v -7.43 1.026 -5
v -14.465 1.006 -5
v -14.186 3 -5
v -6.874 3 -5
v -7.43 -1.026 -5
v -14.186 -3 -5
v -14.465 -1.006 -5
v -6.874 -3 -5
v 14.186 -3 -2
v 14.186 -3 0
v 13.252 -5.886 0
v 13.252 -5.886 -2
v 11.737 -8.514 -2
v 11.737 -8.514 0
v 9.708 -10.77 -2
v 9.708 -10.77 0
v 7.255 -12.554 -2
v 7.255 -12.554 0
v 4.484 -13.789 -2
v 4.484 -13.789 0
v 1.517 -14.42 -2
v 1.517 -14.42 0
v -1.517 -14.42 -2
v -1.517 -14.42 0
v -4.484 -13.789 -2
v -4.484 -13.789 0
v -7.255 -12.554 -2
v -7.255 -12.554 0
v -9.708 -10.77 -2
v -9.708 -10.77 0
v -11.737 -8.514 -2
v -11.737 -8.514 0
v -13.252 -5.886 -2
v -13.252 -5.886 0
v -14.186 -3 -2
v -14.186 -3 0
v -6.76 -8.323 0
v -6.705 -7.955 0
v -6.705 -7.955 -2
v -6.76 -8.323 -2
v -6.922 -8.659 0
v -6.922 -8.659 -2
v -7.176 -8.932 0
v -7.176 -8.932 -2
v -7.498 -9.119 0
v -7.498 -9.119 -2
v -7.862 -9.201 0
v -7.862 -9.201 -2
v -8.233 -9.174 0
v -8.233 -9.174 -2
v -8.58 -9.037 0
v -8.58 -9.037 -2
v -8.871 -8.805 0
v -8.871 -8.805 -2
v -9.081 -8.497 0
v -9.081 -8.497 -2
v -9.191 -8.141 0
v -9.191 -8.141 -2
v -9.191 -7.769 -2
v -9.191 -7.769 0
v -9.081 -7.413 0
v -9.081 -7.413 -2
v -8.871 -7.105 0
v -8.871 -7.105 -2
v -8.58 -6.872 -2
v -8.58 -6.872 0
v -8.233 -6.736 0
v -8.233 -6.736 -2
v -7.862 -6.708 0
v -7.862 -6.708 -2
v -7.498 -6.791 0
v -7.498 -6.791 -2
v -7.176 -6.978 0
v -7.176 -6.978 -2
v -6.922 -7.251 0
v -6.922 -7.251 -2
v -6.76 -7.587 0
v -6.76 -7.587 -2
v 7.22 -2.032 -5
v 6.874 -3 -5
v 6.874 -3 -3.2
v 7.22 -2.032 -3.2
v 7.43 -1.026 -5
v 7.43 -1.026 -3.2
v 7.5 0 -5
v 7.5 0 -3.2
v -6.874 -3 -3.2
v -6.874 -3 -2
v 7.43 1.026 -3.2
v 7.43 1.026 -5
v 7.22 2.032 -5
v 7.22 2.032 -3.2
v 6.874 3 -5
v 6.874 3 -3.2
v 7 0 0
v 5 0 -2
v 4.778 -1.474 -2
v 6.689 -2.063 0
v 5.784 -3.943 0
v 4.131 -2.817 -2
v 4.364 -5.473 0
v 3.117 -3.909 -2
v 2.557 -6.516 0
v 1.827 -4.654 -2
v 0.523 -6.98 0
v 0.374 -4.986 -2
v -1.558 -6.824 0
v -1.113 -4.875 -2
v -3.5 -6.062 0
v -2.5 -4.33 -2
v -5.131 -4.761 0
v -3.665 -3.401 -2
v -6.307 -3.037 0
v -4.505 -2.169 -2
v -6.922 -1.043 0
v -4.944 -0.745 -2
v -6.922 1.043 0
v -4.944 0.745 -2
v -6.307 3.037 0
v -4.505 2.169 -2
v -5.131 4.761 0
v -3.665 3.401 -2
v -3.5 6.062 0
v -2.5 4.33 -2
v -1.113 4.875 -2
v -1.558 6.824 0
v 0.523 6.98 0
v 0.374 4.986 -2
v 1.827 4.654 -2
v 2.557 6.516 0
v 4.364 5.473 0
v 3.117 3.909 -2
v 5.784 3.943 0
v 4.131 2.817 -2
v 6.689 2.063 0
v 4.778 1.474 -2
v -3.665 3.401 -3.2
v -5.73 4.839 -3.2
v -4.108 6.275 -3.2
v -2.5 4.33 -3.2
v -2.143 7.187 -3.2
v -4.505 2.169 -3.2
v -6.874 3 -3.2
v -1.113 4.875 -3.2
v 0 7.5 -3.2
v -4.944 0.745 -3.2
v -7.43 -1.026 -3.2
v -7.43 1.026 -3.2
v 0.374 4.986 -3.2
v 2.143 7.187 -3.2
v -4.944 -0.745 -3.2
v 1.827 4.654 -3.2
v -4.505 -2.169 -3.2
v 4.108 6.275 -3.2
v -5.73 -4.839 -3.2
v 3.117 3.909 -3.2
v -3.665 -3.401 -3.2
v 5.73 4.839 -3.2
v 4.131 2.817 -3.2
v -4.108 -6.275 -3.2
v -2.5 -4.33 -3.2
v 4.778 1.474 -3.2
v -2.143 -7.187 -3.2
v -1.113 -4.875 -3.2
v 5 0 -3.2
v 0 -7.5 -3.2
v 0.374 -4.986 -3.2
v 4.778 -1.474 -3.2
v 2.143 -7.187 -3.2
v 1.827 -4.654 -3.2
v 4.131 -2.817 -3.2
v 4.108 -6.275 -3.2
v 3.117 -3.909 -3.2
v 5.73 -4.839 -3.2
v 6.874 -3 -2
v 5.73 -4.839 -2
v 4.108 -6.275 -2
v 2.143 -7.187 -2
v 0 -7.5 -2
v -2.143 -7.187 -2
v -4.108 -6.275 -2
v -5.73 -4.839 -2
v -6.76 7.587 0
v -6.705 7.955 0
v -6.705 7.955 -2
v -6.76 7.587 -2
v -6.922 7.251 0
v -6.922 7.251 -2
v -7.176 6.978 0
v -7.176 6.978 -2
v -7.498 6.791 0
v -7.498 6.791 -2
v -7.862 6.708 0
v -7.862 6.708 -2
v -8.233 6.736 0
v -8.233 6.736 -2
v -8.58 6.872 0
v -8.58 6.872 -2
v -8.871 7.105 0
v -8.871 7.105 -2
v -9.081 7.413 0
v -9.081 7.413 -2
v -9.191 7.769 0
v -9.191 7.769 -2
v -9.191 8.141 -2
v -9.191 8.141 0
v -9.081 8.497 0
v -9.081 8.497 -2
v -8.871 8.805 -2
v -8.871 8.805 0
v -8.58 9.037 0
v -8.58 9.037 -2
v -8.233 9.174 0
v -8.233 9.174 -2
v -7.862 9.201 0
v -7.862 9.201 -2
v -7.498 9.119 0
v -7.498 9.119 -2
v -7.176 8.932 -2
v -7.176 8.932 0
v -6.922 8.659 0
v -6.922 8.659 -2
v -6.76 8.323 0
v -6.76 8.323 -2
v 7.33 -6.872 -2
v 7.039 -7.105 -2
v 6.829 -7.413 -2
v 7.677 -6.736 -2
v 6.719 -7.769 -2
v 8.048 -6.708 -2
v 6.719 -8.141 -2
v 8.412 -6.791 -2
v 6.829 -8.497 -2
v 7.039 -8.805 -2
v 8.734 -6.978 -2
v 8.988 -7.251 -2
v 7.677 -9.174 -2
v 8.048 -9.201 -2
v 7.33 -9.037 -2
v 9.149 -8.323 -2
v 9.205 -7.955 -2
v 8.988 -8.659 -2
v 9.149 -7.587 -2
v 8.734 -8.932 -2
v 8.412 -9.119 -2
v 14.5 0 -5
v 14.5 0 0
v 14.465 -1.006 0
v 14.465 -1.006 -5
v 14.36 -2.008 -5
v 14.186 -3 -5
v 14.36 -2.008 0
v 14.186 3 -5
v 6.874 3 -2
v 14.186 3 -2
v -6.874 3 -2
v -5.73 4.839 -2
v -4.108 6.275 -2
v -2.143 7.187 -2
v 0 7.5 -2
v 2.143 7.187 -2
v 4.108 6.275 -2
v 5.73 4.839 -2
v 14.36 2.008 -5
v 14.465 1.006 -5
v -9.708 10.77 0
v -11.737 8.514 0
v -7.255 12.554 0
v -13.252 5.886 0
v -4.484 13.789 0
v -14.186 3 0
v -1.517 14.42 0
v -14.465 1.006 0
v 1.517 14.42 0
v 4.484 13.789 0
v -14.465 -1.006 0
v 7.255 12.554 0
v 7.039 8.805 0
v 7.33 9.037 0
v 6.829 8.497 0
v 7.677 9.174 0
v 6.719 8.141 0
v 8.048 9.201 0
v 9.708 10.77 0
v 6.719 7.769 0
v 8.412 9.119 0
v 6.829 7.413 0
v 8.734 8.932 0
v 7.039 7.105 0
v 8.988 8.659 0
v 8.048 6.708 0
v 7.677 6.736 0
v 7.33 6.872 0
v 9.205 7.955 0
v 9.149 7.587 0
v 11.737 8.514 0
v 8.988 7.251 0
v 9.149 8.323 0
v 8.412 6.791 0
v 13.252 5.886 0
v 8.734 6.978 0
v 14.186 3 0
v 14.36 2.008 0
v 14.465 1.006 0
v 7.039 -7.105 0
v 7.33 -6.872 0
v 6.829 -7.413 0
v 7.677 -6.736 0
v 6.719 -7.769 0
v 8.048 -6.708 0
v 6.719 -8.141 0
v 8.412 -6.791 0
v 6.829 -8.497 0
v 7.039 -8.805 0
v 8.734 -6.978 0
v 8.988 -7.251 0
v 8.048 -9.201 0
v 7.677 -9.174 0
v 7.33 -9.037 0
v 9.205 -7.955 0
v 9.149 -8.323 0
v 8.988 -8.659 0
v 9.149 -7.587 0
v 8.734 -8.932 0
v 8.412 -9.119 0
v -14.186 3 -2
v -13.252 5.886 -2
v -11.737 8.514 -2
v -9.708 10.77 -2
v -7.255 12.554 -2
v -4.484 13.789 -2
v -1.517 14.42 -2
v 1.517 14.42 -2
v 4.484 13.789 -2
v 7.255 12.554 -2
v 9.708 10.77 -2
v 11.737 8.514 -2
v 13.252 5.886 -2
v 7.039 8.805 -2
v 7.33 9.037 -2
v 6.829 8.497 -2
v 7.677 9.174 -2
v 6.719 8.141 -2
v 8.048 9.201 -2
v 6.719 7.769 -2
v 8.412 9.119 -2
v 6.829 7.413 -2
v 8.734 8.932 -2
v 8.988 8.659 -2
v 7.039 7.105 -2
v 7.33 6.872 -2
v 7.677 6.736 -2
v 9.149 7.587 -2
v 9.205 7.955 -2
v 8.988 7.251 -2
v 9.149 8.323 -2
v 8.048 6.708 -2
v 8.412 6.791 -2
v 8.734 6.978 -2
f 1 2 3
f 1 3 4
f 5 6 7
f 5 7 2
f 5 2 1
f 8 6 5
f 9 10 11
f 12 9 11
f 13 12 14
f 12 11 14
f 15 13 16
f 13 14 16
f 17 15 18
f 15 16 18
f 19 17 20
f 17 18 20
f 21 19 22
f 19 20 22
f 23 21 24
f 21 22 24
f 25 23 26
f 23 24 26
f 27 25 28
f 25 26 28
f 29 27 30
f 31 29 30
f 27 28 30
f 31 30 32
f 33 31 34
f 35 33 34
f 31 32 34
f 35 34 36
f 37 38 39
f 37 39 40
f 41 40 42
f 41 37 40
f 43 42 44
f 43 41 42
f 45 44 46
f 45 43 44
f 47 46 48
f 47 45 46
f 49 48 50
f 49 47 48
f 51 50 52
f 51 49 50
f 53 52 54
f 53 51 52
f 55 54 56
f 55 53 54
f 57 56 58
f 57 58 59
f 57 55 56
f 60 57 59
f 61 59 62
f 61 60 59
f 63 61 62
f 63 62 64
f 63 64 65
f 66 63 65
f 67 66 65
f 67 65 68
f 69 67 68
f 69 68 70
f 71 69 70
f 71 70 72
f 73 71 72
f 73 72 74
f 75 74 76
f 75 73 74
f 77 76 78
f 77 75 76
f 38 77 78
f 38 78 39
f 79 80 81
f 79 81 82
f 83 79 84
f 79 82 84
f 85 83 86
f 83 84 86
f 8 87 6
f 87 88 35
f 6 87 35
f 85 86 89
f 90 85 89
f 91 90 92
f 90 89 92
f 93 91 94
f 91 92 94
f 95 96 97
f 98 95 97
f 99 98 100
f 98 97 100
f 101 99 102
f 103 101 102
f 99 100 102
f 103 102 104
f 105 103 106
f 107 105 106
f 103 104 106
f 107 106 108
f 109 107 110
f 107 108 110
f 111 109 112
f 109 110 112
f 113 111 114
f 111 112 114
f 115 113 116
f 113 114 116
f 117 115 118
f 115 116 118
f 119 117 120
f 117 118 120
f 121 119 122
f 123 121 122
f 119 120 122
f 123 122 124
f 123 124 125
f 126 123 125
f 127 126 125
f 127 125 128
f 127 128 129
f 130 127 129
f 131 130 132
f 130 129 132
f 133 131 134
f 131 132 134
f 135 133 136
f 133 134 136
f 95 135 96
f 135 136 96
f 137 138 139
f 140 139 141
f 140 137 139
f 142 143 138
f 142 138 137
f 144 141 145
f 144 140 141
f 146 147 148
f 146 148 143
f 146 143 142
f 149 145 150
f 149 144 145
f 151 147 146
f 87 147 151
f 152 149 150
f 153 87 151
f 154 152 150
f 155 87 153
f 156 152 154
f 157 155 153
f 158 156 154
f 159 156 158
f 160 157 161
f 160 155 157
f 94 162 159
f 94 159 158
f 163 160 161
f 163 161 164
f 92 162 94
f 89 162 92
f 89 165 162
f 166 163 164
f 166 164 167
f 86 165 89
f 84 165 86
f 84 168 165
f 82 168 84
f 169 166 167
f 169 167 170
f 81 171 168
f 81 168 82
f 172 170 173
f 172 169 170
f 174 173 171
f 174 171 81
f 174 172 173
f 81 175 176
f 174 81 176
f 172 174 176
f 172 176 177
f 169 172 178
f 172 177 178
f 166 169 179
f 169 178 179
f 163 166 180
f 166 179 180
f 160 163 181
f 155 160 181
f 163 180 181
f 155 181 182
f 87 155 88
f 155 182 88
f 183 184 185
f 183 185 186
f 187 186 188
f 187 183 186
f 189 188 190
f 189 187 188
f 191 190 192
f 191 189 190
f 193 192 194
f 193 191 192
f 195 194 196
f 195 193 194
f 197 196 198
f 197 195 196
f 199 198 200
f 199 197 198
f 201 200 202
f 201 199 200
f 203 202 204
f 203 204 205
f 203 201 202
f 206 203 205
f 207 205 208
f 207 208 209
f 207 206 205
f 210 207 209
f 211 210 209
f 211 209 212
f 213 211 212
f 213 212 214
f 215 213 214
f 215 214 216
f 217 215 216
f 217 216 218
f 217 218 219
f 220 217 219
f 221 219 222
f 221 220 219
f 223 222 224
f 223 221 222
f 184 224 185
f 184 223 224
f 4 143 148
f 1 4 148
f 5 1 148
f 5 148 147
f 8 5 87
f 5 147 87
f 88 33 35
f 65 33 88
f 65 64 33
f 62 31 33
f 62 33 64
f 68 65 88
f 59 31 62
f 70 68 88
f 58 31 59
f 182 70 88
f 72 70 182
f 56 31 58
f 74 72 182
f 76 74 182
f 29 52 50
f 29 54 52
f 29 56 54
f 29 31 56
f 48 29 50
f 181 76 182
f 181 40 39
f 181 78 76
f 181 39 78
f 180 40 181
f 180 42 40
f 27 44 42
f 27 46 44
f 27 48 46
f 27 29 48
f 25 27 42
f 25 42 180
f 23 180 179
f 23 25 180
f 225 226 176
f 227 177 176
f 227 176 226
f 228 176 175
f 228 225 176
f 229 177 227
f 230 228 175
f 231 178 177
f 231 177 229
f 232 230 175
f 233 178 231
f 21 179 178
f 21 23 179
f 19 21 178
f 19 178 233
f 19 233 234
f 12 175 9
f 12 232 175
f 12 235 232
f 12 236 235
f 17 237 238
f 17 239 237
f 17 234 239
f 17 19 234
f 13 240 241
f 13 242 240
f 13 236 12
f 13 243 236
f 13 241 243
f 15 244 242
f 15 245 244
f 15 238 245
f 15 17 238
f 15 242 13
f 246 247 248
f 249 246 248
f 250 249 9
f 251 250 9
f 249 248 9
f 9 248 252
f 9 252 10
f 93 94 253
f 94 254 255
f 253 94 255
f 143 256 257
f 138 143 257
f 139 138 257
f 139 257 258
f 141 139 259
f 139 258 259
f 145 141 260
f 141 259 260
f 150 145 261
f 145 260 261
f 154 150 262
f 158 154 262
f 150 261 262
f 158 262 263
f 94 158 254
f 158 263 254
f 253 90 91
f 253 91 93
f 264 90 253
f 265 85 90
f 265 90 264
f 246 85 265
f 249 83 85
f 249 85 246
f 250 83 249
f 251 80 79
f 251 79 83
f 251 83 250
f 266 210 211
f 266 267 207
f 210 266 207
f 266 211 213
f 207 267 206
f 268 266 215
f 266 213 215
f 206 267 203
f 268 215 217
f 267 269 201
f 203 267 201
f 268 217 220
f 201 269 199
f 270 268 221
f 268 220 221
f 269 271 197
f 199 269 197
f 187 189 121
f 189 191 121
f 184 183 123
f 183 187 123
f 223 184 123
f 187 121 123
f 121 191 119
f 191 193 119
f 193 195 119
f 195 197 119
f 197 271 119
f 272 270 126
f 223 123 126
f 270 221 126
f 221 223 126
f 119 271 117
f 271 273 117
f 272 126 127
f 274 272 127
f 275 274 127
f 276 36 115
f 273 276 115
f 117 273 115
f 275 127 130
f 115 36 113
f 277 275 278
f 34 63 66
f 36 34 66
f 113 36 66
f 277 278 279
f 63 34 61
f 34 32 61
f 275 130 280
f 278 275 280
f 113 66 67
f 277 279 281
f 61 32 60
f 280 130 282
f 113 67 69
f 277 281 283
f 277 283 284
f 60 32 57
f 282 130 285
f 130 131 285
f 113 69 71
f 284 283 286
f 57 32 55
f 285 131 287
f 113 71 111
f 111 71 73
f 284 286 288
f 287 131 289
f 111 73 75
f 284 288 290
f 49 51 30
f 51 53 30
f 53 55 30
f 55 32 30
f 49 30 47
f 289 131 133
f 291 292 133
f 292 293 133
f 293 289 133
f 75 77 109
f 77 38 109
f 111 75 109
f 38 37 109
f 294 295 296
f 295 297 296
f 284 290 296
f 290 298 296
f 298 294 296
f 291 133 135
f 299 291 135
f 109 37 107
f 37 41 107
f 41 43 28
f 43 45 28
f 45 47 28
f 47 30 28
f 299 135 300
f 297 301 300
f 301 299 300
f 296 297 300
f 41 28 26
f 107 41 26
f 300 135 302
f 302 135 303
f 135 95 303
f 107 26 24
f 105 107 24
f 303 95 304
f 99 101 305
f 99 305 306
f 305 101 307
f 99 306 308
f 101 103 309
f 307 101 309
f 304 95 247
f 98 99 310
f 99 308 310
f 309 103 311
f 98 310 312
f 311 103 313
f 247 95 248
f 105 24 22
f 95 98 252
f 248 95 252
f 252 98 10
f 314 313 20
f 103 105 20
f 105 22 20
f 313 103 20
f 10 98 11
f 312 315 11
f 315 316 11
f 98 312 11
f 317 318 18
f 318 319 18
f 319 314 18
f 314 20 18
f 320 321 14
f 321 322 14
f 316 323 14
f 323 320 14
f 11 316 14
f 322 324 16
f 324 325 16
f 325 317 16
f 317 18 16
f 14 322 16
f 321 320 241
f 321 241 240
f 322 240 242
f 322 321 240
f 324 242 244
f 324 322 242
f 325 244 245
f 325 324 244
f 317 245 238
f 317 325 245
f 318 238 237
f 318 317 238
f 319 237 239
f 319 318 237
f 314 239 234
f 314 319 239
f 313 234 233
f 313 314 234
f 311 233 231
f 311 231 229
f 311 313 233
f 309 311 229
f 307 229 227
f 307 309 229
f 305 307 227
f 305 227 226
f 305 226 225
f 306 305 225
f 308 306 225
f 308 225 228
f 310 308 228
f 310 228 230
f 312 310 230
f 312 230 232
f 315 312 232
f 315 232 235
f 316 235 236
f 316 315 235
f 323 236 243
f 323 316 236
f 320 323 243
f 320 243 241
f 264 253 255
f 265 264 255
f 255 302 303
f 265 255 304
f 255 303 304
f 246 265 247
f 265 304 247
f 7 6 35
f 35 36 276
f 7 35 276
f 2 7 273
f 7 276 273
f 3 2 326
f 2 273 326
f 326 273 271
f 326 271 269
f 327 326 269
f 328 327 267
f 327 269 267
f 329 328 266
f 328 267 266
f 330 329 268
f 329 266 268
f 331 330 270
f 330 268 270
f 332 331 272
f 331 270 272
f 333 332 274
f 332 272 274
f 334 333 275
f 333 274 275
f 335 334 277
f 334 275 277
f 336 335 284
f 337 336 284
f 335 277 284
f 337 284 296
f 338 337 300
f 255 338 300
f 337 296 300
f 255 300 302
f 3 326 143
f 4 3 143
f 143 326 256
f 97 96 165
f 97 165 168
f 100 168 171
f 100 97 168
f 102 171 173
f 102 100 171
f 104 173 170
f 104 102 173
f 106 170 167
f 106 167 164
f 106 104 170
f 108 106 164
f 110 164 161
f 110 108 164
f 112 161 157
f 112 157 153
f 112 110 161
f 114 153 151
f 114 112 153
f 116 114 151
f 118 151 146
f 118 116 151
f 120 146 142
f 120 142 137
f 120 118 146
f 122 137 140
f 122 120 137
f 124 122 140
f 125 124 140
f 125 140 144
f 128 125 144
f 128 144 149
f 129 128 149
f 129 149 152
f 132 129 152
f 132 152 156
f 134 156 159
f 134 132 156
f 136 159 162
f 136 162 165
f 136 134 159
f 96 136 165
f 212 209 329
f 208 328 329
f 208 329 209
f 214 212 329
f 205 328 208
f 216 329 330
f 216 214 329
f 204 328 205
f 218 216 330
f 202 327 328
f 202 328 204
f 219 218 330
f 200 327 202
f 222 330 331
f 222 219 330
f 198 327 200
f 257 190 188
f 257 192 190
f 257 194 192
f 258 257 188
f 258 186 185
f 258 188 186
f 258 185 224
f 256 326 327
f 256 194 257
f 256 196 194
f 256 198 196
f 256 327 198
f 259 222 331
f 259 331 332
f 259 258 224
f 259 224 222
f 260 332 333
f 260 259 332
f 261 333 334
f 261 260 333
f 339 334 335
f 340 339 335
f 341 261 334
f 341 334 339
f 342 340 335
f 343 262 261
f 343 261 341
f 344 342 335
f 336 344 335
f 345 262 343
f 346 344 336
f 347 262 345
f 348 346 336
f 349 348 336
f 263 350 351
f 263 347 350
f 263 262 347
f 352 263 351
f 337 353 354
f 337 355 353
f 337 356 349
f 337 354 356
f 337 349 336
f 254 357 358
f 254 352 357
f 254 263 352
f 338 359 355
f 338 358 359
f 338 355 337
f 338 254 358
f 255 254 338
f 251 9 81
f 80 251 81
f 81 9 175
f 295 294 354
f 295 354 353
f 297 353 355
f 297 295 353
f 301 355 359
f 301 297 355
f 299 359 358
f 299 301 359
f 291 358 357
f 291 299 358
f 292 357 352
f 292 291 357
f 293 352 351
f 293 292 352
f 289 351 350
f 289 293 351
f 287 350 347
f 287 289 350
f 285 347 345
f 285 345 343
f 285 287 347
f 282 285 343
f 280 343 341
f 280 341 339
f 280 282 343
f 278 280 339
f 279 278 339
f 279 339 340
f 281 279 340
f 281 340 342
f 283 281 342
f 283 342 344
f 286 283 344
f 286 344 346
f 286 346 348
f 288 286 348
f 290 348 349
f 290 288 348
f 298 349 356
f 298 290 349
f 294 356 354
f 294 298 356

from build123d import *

# Parameters (mm, degrees)
F0_R     = 5
F2_DEPTH = 3.2
F0_R_2   = 1.25
F3_DEPTH = 2
F4_DEPTH = 5
F5_SIZE  = 2
F6_ANGLE = 180


with BuildPart() as f2:
    # F0 (on Top) → F2 (new body)
    with BuildSketch(Plane.XY):
        with BuildLine():
            ThreePointArc((7.5, 0), (7.341797347, 1.5323223277), (6.8738635424, 3))
            ThreePointArc((6.8738635424, 3), (0, 7.5), (-6.8738635424, 3))
            ThreePointArc((-6.8738635424, 3), (-7.5, 0), (-6.8738635424, -3))
            ThreePointArc((-6.8738635424, -3), (0, -7.5), (6.8738635424, -3))
            ThreePointArc((6.8738635424, -3), (7.341797347, -1.5323223277), (7.5, 0))
        make_face()
        Circle(F0_R, mode=Mode.SUBTRACT)
    extrude(amount=F2_DEPTH)

    # F0 (on Top) → F3 (join)
    with BuildSketch(Plane.XY):
        with BuildLine():
            Line((6.8738635424, 3), (14.1862609591, 3))
            ThreePointArc((14.1862609591, 3), (0, 14.5), (-14.1862609591, 3))
            Line((-14.1862609591, 3), (-6.8738635424, 3))
            ThreePointArc((-6.8738635424, 3), (0, 7.5), (6.8738635424, 3))
        make_face()
        with Locations((-7.9549512883, 7.9549512883)):
            Circle(F0_R_2, mode=Mode.SUBTRACT)
        with Locations((7.9549512883, 7.9549512883)):
            Circle(F0_R_2, mode=Mode.SUBTRACT)
        with BuildLine():
            ThreePointArc((-14.1862609591, -3), (0, -14.5), (14.1862609591, -3))
            Line((14.1862609591, -3), (6.8738635424, -3))
            ThreePointArc((6.8738635424, -3), (0, -7.5), (-6.8738635424, -3))
            Line((-6.8738635424, -3), (-14.1862609591, -3))
        make_face()
        with Locations((-7.9549512883, -7.9549512883)):
            Circle(F0_R_2, mode=Mode.SUBTRACT)
        with Locations((7.9549512883, -7.9549512883)):
            Circle(F0_R_2, mode=Mode.SUBTRACT)
    extrude(amount=F3_DEPTH)

    # F0 (on Top) → F4 (join)
    with BuildSketch(Plane.XY):
        with BuildLine():
            Line((-6.8738635424, 3), (-14.1862609591, 3))
            ThreePointArc((-14.1862609591, 3), (-14.5, 0), (-14.1862609591, -3))
            Line((-14.1862609591, -3), (-6.8738635424, -3))
            ThreePointArc((-6.8738635424, -3), (-7.5, 0), (-6.8738635424, 3))
        make_face()
        with BuildLine():
            ThreePointArc((14.1862609591, -3), (14.4213519461, -1.508180376), (14.5, 0))
            ThreePointArc((14.5, 0), (14.4213519461, 1.508180376), (14.1862609591, 3))
            Line((14.1862609591, 3), (6.8738635424, 3))
            ThreePointArc((6.8738635424, 3), (7.341797347, 1.5323223277), (7.5, 0))
            ThreePointArc((7.5, 0), (7.341797347, -1.5323223277), (6.8738635424, -3))
            Line((6.8738635424, -3), (14.1862609591, -3))
        make_face()
    extrude(amount=F4_DEPTH)

    # F5
    f5_edges = [f2.edges().sort_by_distance(p)[0] for p in [
        (-5, 0, 0),
    ]]
    chamfer(f5_edges, length=F5_SIZE)


with BuildPart() as f2_1:
    # F6: moved
    add(f2.part.rotate(Axis((20.4745046794, 0, 0), (1, 0, 0)), F6_ANGLE))


solid = f2_1.part
